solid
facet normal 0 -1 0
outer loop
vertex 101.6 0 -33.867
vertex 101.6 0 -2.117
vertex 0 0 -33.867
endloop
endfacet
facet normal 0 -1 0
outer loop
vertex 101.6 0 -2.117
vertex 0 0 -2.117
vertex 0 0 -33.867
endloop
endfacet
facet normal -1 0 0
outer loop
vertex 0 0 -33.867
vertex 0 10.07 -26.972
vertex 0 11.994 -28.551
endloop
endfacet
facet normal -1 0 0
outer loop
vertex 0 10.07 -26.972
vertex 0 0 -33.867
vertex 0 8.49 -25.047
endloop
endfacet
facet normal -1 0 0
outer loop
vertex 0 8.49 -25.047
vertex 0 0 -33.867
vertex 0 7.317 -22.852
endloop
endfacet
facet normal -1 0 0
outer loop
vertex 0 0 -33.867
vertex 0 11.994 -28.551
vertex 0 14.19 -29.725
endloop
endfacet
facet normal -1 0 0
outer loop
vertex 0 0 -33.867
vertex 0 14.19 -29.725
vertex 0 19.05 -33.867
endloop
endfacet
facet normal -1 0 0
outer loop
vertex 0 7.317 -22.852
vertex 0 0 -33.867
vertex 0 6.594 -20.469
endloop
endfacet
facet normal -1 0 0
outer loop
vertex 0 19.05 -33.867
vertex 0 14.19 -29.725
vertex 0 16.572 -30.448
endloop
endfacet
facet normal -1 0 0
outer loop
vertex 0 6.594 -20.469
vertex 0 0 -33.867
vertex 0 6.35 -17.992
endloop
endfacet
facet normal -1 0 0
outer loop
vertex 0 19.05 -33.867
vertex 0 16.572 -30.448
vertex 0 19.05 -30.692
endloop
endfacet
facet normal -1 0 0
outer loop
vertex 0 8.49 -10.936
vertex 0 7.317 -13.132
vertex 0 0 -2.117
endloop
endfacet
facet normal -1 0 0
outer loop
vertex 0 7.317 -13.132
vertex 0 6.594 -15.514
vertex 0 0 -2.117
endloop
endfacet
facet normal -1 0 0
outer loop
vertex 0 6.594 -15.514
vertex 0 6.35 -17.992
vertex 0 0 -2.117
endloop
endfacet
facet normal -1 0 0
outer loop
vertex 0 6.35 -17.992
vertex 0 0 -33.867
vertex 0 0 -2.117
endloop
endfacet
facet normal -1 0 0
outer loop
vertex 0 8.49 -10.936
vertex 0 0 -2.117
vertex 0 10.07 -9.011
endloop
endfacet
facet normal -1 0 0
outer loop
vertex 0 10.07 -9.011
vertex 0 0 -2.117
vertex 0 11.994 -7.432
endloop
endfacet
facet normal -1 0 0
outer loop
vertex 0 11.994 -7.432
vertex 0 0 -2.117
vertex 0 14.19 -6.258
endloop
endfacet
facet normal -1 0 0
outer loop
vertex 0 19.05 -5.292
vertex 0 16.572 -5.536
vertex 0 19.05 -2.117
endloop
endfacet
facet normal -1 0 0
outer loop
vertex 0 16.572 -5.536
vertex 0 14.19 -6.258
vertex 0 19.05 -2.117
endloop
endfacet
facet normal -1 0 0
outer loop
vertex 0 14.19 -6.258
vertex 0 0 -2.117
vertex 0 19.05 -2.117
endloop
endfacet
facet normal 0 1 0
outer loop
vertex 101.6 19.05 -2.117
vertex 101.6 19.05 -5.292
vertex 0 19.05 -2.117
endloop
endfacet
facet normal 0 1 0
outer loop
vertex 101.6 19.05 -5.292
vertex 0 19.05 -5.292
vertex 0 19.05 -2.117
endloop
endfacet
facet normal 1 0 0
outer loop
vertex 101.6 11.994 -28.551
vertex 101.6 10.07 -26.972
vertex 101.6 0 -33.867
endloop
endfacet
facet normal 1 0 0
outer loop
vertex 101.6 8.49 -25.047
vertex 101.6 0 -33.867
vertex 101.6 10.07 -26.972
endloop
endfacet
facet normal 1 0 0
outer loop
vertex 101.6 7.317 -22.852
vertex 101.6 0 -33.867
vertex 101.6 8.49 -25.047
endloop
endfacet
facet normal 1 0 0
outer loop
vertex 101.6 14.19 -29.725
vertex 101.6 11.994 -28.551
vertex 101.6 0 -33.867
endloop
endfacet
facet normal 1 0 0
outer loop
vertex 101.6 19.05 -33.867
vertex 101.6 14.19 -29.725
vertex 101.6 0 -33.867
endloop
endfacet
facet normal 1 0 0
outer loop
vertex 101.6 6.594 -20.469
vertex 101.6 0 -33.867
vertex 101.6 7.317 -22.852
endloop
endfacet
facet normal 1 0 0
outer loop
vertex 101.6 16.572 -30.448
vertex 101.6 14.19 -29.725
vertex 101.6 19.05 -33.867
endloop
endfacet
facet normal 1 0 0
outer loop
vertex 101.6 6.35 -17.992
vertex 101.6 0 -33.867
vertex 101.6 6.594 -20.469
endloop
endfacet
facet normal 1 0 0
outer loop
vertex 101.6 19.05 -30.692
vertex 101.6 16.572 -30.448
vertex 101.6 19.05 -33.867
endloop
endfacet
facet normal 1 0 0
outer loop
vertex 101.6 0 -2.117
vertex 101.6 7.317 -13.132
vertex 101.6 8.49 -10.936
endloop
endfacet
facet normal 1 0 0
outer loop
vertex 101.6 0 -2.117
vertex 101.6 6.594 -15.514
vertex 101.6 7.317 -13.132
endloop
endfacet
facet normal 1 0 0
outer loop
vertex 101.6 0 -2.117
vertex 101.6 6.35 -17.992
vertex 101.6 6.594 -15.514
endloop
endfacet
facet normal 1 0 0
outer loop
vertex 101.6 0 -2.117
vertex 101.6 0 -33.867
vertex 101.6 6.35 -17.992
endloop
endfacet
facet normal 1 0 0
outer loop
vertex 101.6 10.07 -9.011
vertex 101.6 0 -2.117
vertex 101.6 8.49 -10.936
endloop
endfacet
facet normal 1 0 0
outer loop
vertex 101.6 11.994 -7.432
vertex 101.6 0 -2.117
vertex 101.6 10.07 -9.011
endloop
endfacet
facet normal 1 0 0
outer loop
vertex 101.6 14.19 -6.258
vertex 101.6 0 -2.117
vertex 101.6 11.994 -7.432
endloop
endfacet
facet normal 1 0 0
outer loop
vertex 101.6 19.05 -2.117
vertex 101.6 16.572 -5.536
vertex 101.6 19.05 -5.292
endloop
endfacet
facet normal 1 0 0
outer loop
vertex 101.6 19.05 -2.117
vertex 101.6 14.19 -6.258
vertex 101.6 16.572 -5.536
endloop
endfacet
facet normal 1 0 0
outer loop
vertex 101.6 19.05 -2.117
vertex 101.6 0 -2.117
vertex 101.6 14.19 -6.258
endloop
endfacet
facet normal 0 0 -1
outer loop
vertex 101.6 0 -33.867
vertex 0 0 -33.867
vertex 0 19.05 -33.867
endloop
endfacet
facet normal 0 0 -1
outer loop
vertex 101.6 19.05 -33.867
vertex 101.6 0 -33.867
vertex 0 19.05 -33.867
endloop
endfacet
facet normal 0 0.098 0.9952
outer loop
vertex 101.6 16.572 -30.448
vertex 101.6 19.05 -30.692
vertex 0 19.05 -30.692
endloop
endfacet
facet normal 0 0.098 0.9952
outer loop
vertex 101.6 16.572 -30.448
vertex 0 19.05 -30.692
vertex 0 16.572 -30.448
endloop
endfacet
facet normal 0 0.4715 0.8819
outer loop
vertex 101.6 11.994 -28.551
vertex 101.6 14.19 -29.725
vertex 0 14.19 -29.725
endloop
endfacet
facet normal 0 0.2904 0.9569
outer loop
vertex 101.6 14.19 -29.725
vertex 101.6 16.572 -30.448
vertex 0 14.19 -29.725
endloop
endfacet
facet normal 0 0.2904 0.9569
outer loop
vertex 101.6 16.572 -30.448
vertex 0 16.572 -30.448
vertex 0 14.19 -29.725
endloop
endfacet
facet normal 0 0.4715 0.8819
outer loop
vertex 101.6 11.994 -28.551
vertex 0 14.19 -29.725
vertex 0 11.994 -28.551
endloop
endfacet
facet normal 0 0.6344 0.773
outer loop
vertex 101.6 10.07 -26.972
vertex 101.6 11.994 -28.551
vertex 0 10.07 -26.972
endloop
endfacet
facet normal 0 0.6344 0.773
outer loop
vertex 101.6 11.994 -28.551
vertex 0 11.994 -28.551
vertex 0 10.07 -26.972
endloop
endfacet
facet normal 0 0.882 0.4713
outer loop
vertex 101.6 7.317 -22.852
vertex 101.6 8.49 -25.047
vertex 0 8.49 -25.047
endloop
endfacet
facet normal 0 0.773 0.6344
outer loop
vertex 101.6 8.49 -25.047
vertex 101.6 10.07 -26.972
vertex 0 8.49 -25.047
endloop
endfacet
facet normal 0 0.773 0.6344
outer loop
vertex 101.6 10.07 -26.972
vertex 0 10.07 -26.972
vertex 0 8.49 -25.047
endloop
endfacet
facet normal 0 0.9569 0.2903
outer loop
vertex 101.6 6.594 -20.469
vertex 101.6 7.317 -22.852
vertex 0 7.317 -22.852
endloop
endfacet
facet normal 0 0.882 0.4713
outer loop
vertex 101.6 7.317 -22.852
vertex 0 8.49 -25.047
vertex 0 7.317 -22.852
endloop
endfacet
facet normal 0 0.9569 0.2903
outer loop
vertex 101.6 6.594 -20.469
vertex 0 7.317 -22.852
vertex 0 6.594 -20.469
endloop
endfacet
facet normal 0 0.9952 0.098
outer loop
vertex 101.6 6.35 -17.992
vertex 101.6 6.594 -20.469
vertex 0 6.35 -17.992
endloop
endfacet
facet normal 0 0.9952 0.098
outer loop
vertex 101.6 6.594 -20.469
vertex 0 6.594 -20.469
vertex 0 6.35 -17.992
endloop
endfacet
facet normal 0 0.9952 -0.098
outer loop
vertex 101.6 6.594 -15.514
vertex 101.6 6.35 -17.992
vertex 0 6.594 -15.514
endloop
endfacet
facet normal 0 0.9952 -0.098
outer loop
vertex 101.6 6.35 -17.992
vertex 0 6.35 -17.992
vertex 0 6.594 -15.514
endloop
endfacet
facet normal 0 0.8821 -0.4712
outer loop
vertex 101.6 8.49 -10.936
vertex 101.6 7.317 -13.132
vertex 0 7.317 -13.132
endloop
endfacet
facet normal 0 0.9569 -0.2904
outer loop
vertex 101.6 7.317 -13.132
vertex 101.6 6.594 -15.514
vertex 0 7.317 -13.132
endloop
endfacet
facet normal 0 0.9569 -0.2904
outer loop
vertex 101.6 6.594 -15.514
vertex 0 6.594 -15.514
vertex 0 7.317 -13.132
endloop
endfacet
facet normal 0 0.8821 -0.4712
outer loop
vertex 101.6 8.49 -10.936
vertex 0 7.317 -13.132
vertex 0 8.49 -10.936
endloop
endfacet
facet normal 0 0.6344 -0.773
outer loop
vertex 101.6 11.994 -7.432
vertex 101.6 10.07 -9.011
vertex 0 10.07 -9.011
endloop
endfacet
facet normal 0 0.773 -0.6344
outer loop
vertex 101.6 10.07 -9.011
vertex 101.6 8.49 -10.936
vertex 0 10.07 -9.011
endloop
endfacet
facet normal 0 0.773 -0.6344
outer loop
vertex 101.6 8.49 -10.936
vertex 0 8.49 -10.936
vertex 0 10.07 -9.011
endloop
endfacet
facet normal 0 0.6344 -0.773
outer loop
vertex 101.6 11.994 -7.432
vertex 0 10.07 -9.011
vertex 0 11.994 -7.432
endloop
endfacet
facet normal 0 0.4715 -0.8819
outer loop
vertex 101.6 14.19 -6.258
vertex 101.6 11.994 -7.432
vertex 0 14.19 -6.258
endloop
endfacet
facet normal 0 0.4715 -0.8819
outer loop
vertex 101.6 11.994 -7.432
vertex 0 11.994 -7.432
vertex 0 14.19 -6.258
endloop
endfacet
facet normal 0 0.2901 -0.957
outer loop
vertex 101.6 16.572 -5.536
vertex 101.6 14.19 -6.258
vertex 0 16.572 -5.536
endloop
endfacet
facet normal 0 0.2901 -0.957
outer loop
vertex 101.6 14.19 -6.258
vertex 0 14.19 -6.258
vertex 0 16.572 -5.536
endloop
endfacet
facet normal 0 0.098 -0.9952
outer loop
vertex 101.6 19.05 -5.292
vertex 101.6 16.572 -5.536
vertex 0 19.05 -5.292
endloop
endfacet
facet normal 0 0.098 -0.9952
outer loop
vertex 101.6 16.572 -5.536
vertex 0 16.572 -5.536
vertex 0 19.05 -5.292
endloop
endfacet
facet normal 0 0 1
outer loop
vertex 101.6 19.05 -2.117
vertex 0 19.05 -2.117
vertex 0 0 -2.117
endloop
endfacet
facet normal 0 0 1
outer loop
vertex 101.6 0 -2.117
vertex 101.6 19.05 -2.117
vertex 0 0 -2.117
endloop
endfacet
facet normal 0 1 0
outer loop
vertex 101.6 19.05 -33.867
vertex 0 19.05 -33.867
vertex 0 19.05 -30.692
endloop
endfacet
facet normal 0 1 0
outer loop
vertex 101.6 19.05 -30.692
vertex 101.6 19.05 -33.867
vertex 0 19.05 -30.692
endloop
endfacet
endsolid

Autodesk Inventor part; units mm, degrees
ref_plane "YZ Plane" through (0, 0, 0) normal (1, 0, 0) x (0, 1, 0)
ref_plane "XZ Plane" through (0, 0, 0) normal (0, 1, 0) x (-1, 0, 0)
ref_plane "XY Plane" through (0, 0, 0) normal (0, 0, 1) x (1, 0, 0)
sketch "Sketch1" plane through (0, 0, 0) normal (1, 0, 0) x (0, 1, 0)
  line L0 (19.05, -2.1167) -> (0, -2.1167)
  line L1 (0, -2.1167) -> (0, -33.8667)
  line L2 (0, -33.8667) -> (19.05, -33.8667)
  arc A0 (19.05, -5.2917) -> (19.05, -30.6917) centre (19.05, -17.9917) ccw
  line L3 (19.05, -33.8667) -> (19.05, -30.6917)
  line L4 (19.05, -5.2917) -> (19.05, -2.1167)
  point P0 (0, 0)
  dimension "d0" = 12.7
  dimension "d1" = 19.05
  dimension "d2" = 31.75
  dimension "d3" = 19.05
  dimension "d4" = 19.05
extrude "Extrusion1" add sketch "Sketch1" along normal blind 101.6
properties part number "Ball Ramp - Goldberg"
